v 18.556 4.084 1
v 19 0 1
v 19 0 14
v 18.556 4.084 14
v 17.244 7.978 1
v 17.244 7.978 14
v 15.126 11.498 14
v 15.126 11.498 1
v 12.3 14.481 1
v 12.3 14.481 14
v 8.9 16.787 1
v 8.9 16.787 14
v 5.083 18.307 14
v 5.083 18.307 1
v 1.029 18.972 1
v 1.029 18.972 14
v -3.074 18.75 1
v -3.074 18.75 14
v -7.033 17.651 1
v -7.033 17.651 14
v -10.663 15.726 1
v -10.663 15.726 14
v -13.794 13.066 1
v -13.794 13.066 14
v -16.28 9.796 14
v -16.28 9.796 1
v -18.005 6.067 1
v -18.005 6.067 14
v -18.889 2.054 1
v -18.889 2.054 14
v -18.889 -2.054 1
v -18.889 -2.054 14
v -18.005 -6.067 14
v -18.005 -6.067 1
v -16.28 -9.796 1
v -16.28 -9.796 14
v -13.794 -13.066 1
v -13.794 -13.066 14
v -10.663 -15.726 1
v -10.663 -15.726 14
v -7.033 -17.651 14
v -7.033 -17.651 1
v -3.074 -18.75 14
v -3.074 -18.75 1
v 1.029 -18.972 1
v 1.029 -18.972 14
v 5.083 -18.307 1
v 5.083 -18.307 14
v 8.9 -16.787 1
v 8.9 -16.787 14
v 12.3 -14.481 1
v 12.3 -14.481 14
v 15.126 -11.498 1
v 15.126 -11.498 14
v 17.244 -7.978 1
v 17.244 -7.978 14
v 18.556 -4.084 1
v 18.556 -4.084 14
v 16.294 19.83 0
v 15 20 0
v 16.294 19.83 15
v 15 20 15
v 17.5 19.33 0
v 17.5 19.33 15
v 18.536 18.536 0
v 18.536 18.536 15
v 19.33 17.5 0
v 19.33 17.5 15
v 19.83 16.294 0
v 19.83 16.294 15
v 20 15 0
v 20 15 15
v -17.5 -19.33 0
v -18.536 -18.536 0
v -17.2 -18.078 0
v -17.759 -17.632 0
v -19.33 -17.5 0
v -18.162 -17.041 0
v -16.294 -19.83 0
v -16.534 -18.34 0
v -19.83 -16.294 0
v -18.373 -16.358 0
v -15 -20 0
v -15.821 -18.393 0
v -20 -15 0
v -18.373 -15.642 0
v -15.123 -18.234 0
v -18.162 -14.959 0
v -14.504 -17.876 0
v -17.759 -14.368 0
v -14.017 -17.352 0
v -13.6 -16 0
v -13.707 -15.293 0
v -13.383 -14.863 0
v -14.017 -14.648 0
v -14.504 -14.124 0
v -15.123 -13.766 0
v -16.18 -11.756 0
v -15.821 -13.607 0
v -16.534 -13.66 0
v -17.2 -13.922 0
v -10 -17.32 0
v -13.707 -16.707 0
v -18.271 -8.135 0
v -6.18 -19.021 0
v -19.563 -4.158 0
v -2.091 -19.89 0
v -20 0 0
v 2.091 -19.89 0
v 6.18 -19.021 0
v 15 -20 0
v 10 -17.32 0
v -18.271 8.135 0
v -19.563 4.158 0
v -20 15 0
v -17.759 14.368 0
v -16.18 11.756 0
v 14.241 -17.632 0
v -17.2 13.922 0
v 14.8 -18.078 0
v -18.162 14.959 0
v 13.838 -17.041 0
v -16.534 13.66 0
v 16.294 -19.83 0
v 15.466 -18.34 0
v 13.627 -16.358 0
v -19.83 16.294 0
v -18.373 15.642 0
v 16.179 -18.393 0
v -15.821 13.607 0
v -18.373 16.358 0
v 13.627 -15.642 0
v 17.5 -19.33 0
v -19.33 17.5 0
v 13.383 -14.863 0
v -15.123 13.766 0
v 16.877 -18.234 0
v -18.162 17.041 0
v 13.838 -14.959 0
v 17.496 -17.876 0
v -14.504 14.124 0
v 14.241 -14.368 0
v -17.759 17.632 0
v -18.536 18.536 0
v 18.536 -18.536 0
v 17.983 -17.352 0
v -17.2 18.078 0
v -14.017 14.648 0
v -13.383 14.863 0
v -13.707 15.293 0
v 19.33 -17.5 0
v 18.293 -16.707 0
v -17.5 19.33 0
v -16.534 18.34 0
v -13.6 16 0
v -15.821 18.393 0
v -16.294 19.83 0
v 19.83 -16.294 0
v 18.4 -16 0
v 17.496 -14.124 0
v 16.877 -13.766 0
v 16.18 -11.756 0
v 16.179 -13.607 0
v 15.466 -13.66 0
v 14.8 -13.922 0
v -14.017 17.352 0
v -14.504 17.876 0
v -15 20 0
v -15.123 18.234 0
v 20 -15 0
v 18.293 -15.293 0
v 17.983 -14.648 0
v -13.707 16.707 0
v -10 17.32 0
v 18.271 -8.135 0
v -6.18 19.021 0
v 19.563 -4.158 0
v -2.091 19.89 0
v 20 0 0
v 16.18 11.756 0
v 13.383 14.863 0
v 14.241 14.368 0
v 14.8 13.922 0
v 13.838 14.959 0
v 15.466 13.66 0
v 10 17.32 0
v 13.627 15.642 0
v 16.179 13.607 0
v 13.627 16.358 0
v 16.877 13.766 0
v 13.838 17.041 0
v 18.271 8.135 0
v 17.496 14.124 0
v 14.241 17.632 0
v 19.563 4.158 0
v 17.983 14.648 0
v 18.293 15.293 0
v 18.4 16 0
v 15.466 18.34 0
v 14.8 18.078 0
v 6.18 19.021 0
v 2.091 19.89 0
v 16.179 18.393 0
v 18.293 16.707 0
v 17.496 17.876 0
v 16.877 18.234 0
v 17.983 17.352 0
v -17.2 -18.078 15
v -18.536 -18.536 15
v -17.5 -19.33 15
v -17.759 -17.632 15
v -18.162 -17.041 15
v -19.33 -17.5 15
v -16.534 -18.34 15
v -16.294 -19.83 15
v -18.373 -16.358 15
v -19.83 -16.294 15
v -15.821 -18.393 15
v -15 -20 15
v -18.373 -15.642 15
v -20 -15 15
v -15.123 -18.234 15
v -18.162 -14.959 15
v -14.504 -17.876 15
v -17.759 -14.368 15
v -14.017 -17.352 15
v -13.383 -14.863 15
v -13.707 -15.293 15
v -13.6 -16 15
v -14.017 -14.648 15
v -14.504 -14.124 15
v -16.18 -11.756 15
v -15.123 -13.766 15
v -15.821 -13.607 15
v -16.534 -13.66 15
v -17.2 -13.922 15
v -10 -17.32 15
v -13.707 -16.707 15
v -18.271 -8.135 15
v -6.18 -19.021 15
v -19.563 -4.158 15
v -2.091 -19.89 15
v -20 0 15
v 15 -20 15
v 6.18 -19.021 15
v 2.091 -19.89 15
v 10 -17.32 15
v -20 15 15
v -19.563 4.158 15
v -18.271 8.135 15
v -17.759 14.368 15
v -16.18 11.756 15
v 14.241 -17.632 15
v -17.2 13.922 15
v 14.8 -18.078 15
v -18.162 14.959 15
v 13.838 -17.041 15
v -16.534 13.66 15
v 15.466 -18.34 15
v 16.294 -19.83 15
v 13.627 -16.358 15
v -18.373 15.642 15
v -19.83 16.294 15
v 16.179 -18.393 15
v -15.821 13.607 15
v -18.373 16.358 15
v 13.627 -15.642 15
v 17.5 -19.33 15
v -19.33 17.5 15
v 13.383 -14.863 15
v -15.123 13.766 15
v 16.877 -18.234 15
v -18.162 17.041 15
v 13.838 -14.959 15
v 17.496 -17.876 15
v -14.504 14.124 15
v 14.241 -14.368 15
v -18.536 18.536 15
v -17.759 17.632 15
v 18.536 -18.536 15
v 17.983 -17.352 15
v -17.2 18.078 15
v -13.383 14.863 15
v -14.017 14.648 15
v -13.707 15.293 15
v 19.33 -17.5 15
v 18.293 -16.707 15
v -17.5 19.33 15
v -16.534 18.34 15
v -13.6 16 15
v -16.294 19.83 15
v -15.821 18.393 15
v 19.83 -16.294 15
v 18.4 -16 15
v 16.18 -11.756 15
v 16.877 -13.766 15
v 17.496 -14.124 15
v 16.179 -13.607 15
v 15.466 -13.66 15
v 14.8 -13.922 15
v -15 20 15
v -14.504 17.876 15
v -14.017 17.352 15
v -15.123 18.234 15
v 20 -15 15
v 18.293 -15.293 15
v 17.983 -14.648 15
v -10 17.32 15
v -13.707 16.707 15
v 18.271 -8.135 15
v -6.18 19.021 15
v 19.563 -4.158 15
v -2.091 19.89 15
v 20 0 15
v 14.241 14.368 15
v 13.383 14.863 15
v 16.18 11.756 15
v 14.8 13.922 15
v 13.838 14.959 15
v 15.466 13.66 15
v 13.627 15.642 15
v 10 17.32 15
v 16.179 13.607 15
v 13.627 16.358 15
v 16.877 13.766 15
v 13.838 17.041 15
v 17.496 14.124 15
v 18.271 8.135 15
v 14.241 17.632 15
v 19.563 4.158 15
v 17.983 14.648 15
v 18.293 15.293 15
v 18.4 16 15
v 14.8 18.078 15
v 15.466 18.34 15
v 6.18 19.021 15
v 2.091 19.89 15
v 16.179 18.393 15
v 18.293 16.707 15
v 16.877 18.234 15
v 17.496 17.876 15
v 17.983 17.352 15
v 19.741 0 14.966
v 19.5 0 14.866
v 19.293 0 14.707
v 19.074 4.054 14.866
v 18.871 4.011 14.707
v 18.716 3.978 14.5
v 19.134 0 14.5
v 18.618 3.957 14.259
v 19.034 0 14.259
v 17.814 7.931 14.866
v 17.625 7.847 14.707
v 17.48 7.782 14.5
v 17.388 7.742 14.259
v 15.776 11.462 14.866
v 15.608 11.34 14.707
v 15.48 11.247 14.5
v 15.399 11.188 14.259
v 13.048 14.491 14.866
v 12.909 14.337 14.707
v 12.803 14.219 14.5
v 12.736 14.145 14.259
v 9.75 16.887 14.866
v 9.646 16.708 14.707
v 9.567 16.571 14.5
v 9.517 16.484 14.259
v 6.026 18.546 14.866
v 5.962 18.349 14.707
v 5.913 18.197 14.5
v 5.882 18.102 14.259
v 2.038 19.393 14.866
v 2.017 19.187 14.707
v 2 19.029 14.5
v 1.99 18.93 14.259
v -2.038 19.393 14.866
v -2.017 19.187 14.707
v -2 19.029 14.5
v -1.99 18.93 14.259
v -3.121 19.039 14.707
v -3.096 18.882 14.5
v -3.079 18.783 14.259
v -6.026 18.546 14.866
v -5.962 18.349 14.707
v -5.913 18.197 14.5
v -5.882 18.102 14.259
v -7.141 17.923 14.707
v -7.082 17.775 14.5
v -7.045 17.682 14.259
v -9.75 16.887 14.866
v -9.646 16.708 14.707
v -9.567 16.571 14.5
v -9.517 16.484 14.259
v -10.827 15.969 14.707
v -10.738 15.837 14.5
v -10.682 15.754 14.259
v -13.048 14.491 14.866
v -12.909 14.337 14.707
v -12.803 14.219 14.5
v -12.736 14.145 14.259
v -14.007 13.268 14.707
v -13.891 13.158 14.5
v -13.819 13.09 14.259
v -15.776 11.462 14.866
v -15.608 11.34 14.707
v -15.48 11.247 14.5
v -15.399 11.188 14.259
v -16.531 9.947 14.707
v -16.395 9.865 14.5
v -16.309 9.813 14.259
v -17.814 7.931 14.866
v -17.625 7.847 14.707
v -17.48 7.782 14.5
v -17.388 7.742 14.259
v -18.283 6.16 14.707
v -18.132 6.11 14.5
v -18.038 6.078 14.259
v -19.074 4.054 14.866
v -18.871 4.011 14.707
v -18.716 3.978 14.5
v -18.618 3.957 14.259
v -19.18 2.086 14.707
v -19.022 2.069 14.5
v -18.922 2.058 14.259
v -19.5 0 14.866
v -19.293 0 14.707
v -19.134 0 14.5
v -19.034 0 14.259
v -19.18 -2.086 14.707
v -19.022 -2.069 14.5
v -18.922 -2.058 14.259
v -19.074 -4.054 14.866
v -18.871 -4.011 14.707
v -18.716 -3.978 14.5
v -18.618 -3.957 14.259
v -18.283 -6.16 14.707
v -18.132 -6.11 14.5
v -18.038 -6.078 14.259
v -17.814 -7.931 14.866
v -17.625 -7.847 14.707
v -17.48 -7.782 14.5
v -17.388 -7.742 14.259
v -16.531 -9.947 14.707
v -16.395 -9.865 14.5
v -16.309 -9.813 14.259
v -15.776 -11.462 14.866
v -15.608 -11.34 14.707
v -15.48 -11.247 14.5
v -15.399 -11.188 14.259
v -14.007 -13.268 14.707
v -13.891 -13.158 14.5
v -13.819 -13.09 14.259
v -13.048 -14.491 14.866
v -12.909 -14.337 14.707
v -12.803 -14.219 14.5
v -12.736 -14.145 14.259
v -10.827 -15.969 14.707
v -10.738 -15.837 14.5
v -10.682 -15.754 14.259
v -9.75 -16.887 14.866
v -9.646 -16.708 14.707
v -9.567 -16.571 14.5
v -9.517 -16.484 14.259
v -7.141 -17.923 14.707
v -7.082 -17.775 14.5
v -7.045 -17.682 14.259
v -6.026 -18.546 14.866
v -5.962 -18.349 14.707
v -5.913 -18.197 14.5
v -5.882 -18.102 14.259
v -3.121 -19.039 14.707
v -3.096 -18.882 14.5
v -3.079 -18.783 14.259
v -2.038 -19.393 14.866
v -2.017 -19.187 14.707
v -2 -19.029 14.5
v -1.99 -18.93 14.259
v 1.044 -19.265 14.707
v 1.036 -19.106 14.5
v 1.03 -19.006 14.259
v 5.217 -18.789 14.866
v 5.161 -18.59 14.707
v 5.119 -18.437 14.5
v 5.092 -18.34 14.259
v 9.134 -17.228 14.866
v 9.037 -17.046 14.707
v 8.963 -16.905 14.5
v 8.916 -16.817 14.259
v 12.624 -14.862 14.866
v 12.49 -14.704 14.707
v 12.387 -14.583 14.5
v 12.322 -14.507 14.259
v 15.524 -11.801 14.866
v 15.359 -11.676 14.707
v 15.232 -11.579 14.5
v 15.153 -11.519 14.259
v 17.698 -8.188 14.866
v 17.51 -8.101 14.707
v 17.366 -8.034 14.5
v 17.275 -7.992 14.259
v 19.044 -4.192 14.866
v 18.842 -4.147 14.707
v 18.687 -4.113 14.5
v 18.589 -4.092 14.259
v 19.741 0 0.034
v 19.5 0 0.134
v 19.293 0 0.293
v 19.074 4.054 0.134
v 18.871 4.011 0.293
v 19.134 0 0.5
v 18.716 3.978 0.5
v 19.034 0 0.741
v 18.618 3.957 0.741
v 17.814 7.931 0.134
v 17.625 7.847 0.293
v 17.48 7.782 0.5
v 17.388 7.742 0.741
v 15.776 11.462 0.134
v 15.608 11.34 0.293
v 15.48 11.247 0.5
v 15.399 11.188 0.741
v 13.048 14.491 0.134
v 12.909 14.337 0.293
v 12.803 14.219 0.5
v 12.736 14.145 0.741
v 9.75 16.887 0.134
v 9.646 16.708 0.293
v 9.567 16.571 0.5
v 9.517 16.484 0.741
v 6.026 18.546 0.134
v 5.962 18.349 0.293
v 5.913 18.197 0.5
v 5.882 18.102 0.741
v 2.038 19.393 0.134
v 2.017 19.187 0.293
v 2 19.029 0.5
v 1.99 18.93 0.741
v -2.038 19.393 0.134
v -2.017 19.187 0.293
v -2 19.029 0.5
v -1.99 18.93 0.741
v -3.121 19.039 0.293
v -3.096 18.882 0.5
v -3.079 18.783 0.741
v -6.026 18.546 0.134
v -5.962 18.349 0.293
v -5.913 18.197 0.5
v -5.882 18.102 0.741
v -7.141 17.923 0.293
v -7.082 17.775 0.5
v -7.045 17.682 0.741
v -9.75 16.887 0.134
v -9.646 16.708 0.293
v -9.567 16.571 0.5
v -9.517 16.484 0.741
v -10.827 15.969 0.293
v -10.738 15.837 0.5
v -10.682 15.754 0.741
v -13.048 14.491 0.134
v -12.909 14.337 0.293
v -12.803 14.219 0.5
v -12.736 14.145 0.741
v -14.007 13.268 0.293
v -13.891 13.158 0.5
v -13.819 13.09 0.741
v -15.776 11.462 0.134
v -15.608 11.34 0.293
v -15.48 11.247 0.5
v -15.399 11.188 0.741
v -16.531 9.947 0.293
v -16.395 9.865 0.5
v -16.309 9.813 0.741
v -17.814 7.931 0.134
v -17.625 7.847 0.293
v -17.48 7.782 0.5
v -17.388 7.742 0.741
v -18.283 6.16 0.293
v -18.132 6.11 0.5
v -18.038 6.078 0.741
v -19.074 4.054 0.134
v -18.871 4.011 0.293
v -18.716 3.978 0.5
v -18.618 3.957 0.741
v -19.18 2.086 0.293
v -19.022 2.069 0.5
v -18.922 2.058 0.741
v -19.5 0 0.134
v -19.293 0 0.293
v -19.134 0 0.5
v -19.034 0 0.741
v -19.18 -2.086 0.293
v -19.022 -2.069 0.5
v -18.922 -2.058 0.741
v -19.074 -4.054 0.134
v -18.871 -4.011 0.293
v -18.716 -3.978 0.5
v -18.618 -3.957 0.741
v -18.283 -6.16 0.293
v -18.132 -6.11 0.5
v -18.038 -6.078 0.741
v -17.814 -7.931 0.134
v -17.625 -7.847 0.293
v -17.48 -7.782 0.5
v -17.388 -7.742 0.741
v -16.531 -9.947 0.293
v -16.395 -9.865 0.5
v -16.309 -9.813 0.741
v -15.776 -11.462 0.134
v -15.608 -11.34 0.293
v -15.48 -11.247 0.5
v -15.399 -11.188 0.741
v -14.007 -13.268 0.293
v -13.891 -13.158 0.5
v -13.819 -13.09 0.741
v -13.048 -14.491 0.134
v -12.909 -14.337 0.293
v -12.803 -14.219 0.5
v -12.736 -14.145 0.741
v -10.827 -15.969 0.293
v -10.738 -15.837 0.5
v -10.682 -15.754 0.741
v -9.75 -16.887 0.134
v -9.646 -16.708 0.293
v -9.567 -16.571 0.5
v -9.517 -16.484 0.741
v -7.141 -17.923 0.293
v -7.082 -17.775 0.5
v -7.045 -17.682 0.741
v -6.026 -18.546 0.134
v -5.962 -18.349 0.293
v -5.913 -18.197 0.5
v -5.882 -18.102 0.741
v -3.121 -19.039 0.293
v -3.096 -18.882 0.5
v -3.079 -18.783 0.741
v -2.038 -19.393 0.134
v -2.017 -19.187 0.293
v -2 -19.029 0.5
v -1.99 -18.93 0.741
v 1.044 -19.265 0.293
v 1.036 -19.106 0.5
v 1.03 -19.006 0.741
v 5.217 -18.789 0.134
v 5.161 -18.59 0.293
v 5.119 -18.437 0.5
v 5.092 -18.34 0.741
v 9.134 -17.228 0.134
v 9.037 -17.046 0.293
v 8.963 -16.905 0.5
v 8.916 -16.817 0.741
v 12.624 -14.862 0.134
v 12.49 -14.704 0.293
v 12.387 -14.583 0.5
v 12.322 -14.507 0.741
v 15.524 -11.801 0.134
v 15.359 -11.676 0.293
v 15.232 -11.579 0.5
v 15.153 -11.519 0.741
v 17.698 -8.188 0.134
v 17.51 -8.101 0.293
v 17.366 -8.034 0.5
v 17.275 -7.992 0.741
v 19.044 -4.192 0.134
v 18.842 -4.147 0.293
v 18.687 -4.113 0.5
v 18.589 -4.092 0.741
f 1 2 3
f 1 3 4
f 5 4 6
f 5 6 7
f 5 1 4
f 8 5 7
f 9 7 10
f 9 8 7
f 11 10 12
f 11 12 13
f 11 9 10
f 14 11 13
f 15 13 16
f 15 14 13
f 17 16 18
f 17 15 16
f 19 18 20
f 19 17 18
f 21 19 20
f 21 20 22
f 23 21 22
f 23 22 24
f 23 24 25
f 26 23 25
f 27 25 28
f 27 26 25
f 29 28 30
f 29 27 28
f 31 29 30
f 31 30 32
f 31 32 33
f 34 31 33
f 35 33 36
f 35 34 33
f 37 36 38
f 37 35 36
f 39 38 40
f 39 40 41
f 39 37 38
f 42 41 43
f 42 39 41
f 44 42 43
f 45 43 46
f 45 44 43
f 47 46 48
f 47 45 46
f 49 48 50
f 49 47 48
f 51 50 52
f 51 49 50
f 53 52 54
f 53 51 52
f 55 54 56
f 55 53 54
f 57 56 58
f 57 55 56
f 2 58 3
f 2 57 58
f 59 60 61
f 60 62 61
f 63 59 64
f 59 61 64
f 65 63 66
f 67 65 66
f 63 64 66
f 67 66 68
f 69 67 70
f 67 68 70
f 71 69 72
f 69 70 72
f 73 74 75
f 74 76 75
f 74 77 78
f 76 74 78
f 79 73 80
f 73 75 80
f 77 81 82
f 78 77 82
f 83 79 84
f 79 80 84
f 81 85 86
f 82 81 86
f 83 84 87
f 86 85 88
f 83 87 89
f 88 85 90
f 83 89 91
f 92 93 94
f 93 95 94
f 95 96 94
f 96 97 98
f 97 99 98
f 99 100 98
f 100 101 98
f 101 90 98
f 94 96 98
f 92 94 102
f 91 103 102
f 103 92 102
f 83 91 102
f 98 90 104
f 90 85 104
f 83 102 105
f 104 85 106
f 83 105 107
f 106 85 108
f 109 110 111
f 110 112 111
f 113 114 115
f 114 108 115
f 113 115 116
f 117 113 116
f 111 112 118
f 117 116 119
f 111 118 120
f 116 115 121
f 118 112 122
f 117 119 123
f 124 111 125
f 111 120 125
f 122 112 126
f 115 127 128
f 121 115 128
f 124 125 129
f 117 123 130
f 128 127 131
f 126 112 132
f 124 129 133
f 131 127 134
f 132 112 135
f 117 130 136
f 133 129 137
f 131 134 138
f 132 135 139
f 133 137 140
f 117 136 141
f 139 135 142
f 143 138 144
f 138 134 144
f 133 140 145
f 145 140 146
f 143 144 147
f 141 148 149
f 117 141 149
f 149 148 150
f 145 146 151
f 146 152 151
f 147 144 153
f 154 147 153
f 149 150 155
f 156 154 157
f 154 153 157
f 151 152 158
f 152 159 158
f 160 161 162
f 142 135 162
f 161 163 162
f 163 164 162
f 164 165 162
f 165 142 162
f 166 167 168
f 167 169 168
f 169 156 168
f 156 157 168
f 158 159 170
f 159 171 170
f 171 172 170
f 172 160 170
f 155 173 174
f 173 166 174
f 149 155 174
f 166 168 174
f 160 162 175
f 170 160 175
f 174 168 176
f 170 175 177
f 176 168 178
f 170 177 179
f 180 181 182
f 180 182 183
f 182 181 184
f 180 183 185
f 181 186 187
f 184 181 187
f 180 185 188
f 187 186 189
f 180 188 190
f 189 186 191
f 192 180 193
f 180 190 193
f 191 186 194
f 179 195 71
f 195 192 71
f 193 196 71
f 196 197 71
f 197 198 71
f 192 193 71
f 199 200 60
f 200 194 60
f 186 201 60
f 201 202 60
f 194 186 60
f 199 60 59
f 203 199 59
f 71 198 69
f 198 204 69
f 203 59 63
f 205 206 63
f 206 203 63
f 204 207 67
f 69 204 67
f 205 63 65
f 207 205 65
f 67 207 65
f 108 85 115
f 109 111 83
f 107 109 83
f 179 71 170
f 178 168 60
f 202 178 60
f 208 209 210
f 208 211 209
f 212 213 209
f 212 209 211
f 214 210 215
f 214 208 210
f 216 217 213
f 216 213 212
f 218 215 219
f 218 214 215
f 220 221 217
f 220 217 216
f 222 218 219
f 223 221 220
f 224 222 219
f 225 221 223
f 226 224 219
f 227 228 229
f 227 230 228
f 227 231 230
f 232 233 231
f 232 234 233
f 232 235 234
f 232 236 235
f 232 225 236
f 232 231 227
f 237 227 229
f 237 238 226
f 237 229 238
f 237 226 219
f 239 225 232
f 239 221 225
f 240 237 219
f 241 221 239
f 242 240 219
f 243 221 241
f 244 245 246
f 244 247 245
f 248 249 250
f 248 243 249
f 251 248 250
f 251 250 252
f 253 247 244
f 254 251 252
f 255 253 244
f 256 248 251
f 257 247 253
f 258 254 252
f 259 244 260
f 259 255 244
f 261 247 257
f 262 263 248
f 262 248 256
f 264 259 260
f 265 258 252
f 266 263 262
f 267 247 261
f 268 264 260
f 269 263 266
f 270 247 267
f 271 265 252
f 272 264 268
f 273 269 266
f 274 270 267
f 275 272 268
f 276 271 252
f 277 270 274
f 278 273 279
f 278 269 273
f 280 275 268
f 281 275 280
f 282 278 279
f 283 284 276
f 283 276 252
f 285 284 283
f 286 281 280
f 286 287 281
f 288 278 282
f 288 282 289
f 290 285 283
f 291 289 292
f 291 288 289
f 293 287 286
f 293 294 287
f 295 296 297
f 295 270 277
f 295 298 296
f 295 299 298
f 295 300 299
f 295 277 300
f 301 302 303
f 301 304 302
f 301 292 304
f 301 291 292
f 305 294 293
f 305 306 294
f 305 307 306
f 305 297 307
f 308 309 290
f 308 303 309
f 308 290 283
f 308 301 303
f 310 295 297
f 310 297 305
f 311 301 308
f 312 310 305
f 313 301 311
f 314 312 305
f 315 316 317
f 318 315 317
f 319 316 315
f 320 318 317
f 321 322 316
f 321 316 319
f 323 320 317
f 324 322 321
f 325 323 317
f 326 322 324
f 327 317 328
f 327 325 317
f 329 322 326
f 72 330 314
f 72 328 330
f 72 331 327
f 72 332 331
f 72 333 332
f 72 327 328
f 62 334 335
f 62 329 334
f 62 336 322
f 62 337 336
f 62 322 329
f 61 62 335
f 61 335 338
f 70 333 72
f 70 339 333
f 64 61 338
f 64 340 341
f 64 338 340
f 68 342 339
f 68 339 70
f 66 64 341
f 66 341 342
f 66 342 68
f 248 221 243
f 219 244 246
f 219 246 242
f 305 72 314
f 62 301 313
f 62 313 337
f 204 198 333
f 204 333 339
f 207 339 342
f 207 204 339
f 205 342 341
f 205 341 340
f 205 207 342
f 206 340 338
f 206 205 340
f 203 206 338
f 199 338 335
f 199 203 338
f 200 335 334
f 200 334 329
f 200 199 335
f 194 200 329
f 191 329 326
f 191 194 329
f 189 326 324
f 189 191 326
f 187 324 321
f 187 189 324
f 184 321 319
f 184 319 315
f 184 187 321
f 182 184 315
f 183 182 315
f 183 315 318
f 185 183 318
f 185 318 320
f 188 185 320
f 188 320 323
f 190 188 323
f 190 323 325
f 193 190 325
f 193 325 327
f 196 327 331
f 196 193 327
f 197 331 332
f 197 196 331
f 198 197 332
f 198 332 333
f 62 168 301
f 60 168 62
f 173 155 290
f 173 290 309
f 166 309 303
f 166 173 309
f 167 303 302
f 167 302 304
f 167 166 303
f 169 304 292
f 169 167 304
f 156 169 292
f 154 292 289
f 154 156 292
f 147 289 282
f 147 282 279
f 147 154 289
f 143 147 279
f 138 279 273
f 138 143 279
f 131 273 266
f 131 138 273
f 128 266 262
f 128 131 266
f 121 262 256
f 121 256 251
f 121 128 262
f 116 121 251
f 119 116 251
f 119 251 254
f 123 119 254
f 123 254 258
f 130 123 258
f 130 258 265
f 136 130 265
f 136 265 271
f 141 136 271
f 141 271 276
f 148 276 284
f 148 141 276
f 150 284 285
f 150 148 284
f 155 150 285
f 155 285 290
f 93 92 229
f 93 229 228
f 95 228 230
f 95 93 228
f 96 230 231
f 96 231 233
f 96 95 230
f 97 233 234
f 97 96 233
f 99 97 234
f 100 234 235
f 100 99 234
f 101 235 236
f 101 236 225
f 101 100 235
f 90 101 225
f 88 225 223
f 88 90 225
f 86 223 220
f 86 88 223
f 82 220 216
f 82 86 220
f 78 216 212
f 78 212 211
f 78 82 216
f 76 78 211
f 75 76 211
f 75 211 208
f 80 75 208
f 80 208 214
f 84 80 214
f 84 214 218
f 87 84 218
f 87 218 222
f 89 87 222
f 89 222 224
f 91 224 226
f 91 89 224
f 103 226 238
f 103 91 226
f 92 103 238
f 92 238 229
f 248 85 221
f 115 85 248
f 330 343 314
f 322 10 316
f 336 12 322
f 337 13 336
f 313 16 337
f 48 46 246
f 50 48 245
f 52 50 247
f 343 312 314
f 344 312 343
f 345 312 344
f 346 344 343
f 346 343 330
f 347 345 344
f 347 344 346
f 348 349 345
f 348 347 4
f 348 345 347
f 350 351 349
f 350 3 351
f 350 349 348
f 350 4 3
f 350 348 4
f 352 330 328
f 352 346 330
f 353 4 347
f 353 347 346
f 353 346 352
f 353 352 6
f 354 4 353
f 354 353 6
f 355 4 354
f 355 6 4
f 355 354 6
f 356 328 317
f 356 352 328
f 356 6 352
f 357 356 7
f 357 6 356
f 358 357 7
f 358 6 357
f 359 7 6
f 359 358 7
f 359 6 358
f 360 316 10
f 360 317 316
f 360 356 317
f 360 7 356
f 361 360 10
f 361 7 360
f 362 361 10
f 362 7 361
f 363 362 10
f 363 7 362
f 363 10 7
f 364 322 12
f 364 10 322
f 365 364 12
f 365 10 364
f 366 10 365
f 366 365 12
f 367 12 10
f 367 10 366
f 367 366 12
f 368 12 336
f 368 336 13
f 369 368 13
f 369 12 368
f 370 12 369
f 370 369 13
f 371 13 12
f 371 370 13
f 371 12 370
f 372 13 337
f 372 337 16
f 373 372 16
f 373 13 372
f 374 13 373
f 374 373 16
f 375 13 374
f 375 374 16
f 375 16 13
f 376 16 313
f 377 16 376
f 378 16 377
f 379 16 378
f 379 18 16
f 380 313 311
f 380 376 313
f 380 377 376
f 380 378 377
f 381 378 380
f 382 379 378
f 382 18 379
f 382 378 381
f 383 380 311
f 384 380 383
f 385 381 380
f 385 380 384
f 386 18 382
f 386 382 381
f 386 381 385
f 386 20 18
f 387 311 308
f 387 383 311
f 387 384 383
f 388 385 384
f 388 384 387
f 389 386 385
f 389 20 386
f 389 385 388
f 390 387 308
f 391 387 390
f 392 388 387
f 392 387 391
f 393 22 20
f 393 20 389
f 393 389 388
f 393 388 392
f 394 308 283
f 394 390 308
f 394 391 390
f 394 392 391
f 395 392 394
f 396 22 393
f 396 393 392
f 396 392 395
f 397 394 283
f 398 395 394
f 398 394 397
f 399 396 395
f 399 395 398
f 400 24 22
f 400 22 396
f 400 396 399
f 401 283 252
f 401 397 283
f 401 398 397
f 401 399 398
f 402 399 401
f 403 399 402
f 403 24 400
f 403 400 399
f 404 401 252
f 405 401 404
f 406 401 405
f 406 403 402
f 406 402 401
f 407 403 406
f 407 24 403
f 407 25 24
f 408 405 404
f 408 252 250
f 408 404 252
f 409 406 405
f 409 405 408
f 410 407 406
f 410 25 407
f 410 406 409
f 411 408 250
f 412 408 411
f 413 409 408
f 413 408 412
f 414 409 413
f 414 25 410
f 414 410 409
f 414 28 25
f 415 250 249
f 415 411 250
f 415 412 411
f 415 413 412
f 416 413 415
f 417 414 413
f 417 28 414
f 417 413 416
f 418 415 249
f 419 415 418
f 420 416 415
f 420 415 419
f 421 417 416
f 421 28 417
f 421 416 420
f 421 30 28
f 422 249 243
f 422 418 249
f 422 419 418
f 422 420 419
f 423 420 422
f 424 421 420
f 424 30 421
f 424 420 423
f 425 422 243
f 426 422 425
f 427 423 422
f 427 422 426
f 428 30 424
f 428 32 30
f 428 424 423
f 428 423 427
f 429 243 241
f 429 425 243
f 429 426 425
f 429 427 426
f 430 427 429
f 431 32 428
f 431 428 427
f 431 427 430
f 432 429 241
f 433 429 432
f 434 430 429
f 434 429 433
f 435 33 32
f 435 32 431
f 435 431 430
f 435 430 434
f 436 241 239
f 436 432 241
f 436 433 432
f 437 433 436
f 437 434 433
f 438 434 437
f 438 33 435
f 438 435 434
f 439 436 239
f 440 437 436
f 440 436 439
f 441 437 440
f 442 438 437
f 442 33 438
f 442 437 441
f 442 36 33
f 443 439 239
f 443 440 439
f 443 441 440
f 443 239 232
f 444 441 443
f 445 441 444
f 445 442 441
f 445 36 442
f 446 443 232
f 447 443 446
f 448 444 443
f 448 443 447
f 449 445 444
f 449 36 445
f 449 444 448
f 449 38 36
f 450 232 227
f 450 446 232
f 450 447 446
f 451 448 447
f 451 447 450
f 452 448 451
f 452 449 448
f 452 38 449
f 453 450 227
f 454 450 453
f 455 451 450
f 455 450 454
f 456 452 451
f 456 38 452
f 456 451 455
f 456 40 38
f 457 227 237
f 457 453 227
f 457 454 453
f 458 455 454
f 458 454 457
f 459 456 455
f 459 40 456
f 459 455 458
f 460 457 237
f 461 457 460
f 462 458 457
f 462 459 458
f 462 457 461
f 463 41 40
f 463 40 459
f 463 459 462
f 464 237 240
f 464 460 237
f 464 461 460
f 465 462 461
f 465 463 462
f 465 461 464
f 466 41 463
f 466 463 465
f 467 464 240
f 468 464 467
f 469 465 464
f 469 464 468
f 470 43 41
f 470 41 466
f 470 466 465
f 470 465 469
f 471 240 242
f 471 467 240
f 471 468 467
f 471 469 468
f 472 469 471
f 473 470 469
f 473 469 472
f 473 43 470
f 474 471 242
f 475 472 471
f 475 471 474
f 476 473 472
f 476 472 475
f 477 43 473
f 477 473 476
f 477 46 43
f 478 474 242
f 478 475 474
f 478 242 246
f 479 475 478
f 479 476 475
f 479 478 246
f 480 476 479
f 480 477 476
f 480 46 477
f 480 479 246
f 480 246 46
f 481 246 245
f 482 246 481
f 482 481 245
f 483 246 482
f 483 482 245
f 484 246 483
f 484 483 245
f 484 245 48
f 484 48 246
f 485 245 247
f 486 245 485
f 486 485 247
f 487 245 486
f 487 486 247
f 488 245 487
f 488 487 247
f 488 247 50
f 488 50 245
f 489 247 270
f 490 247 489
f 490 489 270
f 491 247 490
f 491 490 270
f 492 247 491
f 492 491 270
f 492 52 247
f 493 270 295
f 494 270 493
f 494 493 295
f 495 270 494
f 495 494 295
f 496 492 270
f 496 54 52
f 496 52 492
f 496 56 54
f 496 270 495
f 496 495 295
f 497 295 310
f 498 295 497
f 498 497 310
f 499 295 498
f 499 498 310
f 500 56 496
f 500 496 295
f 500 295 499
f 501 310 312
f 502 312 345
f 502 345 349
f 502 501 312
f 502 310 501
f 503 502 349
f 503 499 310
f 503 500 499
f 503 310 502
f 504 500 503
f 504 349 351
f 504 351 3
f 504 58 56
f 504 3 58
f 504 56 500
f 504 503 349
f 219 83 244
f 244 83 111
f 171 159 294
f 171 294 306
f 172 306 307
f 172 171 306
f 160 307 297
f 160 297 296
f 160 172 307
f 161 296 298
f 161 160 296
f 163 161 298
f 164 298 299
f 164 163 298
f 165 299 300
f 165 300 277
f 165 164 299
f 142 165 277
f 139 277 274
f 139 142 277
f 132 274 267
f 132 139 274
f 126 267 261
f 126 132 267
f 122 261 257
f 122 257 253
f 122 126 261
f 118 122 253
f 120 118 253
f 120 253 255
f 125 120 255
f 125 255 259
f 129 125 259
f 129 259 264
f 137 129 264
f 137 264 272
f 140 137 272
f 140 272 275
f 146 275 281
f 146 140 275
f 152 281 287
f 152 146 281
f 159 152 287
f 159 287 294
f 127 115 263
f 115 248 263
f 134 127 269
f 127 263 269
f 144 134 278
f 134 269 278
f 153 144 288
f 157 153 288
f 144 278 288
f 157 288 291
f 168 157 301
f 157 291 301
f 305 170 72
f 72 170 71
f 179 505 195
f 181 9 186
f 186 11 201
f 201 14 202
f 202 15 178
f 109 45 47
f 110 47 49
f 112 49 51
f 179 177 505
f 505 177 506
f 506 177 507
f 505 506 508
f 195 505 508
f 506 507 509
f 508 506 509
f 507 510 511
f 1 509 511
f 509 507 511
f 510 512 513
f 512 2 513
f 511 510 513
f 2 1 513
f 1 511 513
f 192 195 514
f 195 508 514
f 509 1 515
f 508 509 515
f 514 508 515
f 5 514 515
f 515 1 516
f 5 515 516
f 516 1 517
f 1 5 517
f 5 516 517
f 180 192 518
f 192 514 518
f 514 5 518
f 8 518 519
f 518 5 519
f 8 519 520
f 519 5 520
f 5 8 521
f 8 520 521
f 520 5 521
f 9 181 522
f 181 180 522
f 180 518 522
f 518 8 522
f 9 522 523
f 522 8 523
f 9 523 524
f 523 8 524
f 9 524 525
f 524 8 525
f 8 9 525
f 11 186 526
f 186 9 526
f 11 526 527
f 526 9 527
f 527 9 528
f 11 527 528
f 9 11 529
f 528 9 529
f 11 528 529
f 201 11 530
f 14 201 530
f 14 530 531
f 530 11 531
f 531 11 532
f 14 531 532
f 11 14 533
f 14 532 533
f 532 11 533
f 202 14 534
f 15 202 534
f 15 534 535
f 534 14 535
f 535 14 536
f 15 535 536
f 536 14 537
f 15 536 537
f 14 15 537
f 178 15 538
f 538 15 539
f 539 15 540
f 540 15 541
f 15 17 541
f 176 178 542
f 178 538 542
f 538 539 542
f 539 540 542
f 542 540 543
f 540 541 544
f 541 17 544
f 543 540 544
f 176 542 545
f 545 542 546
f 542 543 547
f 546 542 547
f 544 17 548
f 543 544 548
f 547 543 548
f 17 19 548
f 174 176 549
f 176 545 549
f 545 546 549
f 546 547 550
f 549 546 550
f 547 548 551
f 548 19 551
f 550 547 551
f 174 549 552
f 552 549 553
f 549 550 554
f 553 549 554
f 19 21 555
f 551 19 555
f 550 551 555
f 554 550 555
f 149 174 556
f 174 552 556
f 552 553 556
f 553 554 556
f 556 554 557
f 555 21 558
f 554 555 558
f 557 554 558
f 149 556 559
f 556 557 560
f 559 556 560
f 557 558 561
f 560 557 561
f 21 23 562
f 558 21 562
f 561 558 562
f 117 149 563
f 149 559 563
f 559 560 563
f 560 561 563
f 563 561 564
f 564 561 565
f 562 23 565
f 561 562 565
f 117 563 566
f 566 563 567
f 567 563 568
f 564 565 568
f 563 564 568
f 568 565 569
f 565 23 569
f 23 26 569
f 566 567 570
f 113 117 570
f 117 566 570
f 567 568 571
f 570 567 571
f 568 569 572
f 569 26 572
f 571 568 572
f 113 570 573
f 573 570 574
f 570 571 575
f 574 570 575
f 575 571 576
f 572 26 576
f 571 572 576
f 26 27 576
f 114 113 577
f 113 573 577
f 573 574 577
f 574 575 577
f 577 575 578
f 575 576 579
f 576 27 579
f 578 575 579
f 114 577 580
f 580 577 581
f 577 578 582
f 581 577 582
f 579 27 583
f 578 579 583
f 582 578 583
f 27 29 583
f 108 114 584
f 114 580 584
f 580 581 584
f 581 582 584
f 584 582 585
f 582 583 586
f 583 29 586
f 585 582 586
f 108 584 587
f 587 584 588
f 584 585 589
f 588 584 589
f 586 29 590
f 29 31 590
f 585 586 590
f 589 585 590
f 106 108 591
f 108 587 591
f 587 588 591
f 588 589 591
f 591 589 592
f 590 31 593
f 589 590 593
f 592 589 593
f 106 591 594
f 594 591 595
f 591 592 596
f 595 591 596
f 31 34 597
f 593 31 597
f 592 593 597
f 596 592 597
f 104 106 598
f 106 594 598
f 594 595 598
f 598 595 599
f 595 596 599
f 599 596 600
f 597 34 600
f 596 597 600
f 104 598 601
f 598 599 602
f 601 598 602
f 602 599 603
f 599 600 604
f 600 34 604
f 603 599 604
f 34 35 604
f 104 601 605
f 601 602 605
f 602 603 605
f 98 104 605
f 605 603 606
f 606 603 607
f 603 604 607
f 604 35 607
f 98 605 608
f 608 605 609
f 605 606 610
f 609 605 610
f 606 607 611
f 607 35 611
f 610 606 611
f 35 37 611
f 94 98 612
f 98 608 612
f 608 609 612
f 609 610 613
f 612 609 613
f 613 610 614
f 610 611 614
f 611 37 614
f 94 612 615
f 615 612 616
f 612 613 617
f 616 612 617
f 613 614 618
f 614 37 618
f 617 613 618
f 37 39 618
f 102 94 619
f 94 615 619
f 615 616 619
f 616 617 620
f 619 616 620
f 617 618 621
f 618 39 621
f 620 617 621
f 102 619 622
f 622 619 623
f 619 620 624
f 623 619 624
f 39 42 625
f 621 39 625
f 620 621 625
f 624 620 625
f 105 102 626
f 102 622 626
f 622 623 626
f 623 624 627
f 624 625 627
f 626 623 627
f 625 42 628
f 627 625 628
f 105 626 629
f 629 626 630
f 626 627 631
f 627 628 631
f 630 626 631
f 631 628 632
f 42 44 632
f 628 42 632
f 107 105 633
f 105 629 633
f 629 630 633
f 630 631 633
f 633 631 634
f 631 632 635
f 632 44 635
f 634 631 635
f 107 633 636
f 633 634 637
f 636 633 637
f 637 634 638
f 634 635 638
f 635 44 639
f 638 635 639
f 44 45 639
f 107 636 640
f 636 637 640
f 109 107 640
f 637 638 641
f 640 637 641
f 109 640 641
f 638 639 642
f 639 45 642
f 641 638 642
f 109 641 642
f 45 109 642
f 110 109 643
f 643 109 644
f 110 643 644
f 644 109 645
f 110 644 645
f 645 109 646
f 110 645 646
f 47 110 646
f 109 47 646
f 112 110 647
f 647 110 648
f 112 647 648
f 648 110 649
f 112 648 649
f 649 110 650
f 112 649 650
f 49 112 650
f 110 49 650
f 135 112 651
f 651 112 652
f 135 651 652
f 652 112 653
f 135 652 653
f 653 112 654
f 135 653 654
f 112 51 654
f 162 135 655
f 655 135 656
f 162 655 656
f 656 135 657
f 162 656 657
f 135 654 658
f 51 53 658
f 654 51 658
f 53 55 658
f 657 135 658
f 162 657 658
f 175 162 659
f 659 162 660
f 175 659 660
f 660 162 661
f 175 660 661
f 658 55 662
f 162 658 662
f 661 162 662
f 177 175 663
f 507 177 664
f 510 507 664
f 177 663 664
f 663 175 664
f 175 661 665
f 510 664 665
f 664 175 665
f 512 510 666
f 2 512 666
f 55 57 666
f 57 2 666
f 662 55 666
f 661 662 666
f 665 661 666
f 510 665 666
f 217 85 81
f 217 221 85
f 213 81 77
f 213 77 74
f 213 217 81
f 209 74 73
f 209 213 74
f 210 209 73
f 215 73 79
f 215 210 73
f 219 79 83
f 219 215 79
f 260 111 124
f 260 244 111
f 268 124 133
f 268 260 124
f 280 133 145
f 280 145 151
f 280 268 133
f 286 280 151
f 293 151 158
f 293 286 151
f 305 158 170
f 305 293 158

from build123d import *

# Parameters (mm, degrees)
F0_W     = 40
F0_H     = 40
F0_R     = 2.4
F0_R_2   = 19
F1_DEPTH = 15
F2_R     = 5
F3_R     = 0.99999


# Not quite as in the source:
# - a fillet or chamfer is up to 0.001 mm smaller than in the source, because OpenCascade refuses the exact size


with BuildPart() as f1:
    # F0 (on Top) → F1 (new body)
    with BuildSketch(Plane.XY):
        Rectangle(F0_W, F0_H)
        with Locations((-16, -16)):
            Circle(F0_R, mode=Mode.SUBTRACT)
        with Locations((16, -16)):
            Circle(F0_R, mode=Mode.SUBTRACT)
        with Locations((-16, 16)):
            Circle(F0_R, mode=Mode.SUBTRACT)
        Circle(F0_R_2, mode=Mode.SUBTRACT)
        with Locations((16, 16)):
            Circle(F0_R, mode=Mode.SUBTRACT)
    extrude(amount=F1_DEPTH)

    # F2
    f2_edges = [f1.edges().sort_by_distance(p)[0] for p in [
        (20, 20, 7.5),
        (20, -20, 7.5),
        (-20, 20, 7.5),
        (-20, -20, 7.5),
    ]]
    fillet(f2_edges, radius=F2_R)

    # F3 (radius 1 in the source; OpenCascade refuses exactly that, so slightly less here)
    f3_edges = [f1.edges().sort_by_distance(p)[0] for p in [
        (-19, 0, 15),
        (-19, 0, 0),
    ]]
    fillet(f3_edges, radius=F3_R)


solid = f1.part
